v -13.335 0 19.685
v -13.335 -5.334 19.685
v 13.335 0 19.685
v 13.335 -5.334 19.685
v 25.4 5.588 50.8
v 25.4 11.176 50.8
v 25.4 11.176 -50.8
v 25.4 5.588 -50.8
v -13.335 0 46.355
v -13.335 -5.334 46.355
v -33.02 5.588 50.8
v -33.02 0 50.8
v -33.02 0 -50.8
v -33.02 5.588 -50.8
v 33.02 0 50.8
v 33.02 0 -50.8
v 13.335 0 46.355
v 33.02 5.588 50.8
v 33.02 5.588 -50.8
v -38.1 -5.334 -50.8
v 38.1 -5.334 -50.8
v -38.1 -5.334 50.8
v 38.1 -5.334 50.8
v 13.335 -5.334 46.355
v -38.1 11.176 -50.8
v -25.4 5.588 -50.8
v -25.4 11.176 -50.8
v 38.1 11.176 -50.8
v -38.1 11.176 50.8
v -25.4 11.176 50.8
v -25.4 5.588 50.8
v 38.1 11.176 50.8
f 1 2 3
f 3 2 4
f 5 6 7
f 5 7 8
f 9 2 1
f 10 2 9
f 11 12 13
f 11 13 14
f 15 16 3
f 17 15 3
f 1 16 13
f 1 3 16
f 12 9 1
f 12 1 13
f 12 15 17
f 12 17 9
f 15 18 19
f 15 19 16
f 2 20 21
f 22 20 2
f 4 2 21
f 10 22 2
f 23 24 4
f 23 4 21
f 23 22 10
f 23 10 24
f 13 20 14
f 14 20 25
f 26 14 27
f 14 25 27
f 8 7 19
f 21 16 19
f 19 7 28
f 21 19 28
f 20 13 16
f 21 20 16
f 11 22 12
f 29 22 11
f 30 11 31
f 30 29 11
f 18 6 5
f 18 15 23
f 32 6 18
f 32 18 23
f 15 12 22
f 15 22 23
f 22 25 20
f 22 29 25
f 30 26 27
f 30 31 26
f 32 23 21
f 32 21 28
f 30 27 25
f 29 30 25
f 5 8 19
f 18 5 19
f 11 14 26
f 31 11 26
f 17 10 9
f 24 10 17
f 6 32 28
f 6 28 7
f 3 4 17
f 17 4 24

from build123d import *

# Parameters (mm, degrees)
F1_DEPTH = 50.8
F2_W     = 26.67
F2_H     = 26.67
F3_DEPTH = 16.511


with BuildPart() as f1:
    # F0 (on Top) → F1 (new body, symmetric)
    with BuildSketch(Plane.XY):
        Polygon((-38.1, 11.176), (-38.1, -5.334), (0, -5.334), (38.1, -5.334), (38.1, 11.176), (25.4, 11.176), (25.4, 5.588), (33.02, 5.588), (33.02, 0), (0, 0), (-33.02, 0), (-33.02, 5.588), (-25.4, 5.588), (-25.4, 11.176), align=None)
    extrude(amount=F1_DEPTH, both=True)

    # F2 (on face) → F3 (cut, through all)
    with BuildSketch(Plane.XZ.offset(5.334)):
        with Locations((0, 33.02)):
            Rectangle(F2_W, F2_H)
    extrude(amount=-F3_DEPTH, mode=Mode.SUBTRACT)


solid = f1.part
